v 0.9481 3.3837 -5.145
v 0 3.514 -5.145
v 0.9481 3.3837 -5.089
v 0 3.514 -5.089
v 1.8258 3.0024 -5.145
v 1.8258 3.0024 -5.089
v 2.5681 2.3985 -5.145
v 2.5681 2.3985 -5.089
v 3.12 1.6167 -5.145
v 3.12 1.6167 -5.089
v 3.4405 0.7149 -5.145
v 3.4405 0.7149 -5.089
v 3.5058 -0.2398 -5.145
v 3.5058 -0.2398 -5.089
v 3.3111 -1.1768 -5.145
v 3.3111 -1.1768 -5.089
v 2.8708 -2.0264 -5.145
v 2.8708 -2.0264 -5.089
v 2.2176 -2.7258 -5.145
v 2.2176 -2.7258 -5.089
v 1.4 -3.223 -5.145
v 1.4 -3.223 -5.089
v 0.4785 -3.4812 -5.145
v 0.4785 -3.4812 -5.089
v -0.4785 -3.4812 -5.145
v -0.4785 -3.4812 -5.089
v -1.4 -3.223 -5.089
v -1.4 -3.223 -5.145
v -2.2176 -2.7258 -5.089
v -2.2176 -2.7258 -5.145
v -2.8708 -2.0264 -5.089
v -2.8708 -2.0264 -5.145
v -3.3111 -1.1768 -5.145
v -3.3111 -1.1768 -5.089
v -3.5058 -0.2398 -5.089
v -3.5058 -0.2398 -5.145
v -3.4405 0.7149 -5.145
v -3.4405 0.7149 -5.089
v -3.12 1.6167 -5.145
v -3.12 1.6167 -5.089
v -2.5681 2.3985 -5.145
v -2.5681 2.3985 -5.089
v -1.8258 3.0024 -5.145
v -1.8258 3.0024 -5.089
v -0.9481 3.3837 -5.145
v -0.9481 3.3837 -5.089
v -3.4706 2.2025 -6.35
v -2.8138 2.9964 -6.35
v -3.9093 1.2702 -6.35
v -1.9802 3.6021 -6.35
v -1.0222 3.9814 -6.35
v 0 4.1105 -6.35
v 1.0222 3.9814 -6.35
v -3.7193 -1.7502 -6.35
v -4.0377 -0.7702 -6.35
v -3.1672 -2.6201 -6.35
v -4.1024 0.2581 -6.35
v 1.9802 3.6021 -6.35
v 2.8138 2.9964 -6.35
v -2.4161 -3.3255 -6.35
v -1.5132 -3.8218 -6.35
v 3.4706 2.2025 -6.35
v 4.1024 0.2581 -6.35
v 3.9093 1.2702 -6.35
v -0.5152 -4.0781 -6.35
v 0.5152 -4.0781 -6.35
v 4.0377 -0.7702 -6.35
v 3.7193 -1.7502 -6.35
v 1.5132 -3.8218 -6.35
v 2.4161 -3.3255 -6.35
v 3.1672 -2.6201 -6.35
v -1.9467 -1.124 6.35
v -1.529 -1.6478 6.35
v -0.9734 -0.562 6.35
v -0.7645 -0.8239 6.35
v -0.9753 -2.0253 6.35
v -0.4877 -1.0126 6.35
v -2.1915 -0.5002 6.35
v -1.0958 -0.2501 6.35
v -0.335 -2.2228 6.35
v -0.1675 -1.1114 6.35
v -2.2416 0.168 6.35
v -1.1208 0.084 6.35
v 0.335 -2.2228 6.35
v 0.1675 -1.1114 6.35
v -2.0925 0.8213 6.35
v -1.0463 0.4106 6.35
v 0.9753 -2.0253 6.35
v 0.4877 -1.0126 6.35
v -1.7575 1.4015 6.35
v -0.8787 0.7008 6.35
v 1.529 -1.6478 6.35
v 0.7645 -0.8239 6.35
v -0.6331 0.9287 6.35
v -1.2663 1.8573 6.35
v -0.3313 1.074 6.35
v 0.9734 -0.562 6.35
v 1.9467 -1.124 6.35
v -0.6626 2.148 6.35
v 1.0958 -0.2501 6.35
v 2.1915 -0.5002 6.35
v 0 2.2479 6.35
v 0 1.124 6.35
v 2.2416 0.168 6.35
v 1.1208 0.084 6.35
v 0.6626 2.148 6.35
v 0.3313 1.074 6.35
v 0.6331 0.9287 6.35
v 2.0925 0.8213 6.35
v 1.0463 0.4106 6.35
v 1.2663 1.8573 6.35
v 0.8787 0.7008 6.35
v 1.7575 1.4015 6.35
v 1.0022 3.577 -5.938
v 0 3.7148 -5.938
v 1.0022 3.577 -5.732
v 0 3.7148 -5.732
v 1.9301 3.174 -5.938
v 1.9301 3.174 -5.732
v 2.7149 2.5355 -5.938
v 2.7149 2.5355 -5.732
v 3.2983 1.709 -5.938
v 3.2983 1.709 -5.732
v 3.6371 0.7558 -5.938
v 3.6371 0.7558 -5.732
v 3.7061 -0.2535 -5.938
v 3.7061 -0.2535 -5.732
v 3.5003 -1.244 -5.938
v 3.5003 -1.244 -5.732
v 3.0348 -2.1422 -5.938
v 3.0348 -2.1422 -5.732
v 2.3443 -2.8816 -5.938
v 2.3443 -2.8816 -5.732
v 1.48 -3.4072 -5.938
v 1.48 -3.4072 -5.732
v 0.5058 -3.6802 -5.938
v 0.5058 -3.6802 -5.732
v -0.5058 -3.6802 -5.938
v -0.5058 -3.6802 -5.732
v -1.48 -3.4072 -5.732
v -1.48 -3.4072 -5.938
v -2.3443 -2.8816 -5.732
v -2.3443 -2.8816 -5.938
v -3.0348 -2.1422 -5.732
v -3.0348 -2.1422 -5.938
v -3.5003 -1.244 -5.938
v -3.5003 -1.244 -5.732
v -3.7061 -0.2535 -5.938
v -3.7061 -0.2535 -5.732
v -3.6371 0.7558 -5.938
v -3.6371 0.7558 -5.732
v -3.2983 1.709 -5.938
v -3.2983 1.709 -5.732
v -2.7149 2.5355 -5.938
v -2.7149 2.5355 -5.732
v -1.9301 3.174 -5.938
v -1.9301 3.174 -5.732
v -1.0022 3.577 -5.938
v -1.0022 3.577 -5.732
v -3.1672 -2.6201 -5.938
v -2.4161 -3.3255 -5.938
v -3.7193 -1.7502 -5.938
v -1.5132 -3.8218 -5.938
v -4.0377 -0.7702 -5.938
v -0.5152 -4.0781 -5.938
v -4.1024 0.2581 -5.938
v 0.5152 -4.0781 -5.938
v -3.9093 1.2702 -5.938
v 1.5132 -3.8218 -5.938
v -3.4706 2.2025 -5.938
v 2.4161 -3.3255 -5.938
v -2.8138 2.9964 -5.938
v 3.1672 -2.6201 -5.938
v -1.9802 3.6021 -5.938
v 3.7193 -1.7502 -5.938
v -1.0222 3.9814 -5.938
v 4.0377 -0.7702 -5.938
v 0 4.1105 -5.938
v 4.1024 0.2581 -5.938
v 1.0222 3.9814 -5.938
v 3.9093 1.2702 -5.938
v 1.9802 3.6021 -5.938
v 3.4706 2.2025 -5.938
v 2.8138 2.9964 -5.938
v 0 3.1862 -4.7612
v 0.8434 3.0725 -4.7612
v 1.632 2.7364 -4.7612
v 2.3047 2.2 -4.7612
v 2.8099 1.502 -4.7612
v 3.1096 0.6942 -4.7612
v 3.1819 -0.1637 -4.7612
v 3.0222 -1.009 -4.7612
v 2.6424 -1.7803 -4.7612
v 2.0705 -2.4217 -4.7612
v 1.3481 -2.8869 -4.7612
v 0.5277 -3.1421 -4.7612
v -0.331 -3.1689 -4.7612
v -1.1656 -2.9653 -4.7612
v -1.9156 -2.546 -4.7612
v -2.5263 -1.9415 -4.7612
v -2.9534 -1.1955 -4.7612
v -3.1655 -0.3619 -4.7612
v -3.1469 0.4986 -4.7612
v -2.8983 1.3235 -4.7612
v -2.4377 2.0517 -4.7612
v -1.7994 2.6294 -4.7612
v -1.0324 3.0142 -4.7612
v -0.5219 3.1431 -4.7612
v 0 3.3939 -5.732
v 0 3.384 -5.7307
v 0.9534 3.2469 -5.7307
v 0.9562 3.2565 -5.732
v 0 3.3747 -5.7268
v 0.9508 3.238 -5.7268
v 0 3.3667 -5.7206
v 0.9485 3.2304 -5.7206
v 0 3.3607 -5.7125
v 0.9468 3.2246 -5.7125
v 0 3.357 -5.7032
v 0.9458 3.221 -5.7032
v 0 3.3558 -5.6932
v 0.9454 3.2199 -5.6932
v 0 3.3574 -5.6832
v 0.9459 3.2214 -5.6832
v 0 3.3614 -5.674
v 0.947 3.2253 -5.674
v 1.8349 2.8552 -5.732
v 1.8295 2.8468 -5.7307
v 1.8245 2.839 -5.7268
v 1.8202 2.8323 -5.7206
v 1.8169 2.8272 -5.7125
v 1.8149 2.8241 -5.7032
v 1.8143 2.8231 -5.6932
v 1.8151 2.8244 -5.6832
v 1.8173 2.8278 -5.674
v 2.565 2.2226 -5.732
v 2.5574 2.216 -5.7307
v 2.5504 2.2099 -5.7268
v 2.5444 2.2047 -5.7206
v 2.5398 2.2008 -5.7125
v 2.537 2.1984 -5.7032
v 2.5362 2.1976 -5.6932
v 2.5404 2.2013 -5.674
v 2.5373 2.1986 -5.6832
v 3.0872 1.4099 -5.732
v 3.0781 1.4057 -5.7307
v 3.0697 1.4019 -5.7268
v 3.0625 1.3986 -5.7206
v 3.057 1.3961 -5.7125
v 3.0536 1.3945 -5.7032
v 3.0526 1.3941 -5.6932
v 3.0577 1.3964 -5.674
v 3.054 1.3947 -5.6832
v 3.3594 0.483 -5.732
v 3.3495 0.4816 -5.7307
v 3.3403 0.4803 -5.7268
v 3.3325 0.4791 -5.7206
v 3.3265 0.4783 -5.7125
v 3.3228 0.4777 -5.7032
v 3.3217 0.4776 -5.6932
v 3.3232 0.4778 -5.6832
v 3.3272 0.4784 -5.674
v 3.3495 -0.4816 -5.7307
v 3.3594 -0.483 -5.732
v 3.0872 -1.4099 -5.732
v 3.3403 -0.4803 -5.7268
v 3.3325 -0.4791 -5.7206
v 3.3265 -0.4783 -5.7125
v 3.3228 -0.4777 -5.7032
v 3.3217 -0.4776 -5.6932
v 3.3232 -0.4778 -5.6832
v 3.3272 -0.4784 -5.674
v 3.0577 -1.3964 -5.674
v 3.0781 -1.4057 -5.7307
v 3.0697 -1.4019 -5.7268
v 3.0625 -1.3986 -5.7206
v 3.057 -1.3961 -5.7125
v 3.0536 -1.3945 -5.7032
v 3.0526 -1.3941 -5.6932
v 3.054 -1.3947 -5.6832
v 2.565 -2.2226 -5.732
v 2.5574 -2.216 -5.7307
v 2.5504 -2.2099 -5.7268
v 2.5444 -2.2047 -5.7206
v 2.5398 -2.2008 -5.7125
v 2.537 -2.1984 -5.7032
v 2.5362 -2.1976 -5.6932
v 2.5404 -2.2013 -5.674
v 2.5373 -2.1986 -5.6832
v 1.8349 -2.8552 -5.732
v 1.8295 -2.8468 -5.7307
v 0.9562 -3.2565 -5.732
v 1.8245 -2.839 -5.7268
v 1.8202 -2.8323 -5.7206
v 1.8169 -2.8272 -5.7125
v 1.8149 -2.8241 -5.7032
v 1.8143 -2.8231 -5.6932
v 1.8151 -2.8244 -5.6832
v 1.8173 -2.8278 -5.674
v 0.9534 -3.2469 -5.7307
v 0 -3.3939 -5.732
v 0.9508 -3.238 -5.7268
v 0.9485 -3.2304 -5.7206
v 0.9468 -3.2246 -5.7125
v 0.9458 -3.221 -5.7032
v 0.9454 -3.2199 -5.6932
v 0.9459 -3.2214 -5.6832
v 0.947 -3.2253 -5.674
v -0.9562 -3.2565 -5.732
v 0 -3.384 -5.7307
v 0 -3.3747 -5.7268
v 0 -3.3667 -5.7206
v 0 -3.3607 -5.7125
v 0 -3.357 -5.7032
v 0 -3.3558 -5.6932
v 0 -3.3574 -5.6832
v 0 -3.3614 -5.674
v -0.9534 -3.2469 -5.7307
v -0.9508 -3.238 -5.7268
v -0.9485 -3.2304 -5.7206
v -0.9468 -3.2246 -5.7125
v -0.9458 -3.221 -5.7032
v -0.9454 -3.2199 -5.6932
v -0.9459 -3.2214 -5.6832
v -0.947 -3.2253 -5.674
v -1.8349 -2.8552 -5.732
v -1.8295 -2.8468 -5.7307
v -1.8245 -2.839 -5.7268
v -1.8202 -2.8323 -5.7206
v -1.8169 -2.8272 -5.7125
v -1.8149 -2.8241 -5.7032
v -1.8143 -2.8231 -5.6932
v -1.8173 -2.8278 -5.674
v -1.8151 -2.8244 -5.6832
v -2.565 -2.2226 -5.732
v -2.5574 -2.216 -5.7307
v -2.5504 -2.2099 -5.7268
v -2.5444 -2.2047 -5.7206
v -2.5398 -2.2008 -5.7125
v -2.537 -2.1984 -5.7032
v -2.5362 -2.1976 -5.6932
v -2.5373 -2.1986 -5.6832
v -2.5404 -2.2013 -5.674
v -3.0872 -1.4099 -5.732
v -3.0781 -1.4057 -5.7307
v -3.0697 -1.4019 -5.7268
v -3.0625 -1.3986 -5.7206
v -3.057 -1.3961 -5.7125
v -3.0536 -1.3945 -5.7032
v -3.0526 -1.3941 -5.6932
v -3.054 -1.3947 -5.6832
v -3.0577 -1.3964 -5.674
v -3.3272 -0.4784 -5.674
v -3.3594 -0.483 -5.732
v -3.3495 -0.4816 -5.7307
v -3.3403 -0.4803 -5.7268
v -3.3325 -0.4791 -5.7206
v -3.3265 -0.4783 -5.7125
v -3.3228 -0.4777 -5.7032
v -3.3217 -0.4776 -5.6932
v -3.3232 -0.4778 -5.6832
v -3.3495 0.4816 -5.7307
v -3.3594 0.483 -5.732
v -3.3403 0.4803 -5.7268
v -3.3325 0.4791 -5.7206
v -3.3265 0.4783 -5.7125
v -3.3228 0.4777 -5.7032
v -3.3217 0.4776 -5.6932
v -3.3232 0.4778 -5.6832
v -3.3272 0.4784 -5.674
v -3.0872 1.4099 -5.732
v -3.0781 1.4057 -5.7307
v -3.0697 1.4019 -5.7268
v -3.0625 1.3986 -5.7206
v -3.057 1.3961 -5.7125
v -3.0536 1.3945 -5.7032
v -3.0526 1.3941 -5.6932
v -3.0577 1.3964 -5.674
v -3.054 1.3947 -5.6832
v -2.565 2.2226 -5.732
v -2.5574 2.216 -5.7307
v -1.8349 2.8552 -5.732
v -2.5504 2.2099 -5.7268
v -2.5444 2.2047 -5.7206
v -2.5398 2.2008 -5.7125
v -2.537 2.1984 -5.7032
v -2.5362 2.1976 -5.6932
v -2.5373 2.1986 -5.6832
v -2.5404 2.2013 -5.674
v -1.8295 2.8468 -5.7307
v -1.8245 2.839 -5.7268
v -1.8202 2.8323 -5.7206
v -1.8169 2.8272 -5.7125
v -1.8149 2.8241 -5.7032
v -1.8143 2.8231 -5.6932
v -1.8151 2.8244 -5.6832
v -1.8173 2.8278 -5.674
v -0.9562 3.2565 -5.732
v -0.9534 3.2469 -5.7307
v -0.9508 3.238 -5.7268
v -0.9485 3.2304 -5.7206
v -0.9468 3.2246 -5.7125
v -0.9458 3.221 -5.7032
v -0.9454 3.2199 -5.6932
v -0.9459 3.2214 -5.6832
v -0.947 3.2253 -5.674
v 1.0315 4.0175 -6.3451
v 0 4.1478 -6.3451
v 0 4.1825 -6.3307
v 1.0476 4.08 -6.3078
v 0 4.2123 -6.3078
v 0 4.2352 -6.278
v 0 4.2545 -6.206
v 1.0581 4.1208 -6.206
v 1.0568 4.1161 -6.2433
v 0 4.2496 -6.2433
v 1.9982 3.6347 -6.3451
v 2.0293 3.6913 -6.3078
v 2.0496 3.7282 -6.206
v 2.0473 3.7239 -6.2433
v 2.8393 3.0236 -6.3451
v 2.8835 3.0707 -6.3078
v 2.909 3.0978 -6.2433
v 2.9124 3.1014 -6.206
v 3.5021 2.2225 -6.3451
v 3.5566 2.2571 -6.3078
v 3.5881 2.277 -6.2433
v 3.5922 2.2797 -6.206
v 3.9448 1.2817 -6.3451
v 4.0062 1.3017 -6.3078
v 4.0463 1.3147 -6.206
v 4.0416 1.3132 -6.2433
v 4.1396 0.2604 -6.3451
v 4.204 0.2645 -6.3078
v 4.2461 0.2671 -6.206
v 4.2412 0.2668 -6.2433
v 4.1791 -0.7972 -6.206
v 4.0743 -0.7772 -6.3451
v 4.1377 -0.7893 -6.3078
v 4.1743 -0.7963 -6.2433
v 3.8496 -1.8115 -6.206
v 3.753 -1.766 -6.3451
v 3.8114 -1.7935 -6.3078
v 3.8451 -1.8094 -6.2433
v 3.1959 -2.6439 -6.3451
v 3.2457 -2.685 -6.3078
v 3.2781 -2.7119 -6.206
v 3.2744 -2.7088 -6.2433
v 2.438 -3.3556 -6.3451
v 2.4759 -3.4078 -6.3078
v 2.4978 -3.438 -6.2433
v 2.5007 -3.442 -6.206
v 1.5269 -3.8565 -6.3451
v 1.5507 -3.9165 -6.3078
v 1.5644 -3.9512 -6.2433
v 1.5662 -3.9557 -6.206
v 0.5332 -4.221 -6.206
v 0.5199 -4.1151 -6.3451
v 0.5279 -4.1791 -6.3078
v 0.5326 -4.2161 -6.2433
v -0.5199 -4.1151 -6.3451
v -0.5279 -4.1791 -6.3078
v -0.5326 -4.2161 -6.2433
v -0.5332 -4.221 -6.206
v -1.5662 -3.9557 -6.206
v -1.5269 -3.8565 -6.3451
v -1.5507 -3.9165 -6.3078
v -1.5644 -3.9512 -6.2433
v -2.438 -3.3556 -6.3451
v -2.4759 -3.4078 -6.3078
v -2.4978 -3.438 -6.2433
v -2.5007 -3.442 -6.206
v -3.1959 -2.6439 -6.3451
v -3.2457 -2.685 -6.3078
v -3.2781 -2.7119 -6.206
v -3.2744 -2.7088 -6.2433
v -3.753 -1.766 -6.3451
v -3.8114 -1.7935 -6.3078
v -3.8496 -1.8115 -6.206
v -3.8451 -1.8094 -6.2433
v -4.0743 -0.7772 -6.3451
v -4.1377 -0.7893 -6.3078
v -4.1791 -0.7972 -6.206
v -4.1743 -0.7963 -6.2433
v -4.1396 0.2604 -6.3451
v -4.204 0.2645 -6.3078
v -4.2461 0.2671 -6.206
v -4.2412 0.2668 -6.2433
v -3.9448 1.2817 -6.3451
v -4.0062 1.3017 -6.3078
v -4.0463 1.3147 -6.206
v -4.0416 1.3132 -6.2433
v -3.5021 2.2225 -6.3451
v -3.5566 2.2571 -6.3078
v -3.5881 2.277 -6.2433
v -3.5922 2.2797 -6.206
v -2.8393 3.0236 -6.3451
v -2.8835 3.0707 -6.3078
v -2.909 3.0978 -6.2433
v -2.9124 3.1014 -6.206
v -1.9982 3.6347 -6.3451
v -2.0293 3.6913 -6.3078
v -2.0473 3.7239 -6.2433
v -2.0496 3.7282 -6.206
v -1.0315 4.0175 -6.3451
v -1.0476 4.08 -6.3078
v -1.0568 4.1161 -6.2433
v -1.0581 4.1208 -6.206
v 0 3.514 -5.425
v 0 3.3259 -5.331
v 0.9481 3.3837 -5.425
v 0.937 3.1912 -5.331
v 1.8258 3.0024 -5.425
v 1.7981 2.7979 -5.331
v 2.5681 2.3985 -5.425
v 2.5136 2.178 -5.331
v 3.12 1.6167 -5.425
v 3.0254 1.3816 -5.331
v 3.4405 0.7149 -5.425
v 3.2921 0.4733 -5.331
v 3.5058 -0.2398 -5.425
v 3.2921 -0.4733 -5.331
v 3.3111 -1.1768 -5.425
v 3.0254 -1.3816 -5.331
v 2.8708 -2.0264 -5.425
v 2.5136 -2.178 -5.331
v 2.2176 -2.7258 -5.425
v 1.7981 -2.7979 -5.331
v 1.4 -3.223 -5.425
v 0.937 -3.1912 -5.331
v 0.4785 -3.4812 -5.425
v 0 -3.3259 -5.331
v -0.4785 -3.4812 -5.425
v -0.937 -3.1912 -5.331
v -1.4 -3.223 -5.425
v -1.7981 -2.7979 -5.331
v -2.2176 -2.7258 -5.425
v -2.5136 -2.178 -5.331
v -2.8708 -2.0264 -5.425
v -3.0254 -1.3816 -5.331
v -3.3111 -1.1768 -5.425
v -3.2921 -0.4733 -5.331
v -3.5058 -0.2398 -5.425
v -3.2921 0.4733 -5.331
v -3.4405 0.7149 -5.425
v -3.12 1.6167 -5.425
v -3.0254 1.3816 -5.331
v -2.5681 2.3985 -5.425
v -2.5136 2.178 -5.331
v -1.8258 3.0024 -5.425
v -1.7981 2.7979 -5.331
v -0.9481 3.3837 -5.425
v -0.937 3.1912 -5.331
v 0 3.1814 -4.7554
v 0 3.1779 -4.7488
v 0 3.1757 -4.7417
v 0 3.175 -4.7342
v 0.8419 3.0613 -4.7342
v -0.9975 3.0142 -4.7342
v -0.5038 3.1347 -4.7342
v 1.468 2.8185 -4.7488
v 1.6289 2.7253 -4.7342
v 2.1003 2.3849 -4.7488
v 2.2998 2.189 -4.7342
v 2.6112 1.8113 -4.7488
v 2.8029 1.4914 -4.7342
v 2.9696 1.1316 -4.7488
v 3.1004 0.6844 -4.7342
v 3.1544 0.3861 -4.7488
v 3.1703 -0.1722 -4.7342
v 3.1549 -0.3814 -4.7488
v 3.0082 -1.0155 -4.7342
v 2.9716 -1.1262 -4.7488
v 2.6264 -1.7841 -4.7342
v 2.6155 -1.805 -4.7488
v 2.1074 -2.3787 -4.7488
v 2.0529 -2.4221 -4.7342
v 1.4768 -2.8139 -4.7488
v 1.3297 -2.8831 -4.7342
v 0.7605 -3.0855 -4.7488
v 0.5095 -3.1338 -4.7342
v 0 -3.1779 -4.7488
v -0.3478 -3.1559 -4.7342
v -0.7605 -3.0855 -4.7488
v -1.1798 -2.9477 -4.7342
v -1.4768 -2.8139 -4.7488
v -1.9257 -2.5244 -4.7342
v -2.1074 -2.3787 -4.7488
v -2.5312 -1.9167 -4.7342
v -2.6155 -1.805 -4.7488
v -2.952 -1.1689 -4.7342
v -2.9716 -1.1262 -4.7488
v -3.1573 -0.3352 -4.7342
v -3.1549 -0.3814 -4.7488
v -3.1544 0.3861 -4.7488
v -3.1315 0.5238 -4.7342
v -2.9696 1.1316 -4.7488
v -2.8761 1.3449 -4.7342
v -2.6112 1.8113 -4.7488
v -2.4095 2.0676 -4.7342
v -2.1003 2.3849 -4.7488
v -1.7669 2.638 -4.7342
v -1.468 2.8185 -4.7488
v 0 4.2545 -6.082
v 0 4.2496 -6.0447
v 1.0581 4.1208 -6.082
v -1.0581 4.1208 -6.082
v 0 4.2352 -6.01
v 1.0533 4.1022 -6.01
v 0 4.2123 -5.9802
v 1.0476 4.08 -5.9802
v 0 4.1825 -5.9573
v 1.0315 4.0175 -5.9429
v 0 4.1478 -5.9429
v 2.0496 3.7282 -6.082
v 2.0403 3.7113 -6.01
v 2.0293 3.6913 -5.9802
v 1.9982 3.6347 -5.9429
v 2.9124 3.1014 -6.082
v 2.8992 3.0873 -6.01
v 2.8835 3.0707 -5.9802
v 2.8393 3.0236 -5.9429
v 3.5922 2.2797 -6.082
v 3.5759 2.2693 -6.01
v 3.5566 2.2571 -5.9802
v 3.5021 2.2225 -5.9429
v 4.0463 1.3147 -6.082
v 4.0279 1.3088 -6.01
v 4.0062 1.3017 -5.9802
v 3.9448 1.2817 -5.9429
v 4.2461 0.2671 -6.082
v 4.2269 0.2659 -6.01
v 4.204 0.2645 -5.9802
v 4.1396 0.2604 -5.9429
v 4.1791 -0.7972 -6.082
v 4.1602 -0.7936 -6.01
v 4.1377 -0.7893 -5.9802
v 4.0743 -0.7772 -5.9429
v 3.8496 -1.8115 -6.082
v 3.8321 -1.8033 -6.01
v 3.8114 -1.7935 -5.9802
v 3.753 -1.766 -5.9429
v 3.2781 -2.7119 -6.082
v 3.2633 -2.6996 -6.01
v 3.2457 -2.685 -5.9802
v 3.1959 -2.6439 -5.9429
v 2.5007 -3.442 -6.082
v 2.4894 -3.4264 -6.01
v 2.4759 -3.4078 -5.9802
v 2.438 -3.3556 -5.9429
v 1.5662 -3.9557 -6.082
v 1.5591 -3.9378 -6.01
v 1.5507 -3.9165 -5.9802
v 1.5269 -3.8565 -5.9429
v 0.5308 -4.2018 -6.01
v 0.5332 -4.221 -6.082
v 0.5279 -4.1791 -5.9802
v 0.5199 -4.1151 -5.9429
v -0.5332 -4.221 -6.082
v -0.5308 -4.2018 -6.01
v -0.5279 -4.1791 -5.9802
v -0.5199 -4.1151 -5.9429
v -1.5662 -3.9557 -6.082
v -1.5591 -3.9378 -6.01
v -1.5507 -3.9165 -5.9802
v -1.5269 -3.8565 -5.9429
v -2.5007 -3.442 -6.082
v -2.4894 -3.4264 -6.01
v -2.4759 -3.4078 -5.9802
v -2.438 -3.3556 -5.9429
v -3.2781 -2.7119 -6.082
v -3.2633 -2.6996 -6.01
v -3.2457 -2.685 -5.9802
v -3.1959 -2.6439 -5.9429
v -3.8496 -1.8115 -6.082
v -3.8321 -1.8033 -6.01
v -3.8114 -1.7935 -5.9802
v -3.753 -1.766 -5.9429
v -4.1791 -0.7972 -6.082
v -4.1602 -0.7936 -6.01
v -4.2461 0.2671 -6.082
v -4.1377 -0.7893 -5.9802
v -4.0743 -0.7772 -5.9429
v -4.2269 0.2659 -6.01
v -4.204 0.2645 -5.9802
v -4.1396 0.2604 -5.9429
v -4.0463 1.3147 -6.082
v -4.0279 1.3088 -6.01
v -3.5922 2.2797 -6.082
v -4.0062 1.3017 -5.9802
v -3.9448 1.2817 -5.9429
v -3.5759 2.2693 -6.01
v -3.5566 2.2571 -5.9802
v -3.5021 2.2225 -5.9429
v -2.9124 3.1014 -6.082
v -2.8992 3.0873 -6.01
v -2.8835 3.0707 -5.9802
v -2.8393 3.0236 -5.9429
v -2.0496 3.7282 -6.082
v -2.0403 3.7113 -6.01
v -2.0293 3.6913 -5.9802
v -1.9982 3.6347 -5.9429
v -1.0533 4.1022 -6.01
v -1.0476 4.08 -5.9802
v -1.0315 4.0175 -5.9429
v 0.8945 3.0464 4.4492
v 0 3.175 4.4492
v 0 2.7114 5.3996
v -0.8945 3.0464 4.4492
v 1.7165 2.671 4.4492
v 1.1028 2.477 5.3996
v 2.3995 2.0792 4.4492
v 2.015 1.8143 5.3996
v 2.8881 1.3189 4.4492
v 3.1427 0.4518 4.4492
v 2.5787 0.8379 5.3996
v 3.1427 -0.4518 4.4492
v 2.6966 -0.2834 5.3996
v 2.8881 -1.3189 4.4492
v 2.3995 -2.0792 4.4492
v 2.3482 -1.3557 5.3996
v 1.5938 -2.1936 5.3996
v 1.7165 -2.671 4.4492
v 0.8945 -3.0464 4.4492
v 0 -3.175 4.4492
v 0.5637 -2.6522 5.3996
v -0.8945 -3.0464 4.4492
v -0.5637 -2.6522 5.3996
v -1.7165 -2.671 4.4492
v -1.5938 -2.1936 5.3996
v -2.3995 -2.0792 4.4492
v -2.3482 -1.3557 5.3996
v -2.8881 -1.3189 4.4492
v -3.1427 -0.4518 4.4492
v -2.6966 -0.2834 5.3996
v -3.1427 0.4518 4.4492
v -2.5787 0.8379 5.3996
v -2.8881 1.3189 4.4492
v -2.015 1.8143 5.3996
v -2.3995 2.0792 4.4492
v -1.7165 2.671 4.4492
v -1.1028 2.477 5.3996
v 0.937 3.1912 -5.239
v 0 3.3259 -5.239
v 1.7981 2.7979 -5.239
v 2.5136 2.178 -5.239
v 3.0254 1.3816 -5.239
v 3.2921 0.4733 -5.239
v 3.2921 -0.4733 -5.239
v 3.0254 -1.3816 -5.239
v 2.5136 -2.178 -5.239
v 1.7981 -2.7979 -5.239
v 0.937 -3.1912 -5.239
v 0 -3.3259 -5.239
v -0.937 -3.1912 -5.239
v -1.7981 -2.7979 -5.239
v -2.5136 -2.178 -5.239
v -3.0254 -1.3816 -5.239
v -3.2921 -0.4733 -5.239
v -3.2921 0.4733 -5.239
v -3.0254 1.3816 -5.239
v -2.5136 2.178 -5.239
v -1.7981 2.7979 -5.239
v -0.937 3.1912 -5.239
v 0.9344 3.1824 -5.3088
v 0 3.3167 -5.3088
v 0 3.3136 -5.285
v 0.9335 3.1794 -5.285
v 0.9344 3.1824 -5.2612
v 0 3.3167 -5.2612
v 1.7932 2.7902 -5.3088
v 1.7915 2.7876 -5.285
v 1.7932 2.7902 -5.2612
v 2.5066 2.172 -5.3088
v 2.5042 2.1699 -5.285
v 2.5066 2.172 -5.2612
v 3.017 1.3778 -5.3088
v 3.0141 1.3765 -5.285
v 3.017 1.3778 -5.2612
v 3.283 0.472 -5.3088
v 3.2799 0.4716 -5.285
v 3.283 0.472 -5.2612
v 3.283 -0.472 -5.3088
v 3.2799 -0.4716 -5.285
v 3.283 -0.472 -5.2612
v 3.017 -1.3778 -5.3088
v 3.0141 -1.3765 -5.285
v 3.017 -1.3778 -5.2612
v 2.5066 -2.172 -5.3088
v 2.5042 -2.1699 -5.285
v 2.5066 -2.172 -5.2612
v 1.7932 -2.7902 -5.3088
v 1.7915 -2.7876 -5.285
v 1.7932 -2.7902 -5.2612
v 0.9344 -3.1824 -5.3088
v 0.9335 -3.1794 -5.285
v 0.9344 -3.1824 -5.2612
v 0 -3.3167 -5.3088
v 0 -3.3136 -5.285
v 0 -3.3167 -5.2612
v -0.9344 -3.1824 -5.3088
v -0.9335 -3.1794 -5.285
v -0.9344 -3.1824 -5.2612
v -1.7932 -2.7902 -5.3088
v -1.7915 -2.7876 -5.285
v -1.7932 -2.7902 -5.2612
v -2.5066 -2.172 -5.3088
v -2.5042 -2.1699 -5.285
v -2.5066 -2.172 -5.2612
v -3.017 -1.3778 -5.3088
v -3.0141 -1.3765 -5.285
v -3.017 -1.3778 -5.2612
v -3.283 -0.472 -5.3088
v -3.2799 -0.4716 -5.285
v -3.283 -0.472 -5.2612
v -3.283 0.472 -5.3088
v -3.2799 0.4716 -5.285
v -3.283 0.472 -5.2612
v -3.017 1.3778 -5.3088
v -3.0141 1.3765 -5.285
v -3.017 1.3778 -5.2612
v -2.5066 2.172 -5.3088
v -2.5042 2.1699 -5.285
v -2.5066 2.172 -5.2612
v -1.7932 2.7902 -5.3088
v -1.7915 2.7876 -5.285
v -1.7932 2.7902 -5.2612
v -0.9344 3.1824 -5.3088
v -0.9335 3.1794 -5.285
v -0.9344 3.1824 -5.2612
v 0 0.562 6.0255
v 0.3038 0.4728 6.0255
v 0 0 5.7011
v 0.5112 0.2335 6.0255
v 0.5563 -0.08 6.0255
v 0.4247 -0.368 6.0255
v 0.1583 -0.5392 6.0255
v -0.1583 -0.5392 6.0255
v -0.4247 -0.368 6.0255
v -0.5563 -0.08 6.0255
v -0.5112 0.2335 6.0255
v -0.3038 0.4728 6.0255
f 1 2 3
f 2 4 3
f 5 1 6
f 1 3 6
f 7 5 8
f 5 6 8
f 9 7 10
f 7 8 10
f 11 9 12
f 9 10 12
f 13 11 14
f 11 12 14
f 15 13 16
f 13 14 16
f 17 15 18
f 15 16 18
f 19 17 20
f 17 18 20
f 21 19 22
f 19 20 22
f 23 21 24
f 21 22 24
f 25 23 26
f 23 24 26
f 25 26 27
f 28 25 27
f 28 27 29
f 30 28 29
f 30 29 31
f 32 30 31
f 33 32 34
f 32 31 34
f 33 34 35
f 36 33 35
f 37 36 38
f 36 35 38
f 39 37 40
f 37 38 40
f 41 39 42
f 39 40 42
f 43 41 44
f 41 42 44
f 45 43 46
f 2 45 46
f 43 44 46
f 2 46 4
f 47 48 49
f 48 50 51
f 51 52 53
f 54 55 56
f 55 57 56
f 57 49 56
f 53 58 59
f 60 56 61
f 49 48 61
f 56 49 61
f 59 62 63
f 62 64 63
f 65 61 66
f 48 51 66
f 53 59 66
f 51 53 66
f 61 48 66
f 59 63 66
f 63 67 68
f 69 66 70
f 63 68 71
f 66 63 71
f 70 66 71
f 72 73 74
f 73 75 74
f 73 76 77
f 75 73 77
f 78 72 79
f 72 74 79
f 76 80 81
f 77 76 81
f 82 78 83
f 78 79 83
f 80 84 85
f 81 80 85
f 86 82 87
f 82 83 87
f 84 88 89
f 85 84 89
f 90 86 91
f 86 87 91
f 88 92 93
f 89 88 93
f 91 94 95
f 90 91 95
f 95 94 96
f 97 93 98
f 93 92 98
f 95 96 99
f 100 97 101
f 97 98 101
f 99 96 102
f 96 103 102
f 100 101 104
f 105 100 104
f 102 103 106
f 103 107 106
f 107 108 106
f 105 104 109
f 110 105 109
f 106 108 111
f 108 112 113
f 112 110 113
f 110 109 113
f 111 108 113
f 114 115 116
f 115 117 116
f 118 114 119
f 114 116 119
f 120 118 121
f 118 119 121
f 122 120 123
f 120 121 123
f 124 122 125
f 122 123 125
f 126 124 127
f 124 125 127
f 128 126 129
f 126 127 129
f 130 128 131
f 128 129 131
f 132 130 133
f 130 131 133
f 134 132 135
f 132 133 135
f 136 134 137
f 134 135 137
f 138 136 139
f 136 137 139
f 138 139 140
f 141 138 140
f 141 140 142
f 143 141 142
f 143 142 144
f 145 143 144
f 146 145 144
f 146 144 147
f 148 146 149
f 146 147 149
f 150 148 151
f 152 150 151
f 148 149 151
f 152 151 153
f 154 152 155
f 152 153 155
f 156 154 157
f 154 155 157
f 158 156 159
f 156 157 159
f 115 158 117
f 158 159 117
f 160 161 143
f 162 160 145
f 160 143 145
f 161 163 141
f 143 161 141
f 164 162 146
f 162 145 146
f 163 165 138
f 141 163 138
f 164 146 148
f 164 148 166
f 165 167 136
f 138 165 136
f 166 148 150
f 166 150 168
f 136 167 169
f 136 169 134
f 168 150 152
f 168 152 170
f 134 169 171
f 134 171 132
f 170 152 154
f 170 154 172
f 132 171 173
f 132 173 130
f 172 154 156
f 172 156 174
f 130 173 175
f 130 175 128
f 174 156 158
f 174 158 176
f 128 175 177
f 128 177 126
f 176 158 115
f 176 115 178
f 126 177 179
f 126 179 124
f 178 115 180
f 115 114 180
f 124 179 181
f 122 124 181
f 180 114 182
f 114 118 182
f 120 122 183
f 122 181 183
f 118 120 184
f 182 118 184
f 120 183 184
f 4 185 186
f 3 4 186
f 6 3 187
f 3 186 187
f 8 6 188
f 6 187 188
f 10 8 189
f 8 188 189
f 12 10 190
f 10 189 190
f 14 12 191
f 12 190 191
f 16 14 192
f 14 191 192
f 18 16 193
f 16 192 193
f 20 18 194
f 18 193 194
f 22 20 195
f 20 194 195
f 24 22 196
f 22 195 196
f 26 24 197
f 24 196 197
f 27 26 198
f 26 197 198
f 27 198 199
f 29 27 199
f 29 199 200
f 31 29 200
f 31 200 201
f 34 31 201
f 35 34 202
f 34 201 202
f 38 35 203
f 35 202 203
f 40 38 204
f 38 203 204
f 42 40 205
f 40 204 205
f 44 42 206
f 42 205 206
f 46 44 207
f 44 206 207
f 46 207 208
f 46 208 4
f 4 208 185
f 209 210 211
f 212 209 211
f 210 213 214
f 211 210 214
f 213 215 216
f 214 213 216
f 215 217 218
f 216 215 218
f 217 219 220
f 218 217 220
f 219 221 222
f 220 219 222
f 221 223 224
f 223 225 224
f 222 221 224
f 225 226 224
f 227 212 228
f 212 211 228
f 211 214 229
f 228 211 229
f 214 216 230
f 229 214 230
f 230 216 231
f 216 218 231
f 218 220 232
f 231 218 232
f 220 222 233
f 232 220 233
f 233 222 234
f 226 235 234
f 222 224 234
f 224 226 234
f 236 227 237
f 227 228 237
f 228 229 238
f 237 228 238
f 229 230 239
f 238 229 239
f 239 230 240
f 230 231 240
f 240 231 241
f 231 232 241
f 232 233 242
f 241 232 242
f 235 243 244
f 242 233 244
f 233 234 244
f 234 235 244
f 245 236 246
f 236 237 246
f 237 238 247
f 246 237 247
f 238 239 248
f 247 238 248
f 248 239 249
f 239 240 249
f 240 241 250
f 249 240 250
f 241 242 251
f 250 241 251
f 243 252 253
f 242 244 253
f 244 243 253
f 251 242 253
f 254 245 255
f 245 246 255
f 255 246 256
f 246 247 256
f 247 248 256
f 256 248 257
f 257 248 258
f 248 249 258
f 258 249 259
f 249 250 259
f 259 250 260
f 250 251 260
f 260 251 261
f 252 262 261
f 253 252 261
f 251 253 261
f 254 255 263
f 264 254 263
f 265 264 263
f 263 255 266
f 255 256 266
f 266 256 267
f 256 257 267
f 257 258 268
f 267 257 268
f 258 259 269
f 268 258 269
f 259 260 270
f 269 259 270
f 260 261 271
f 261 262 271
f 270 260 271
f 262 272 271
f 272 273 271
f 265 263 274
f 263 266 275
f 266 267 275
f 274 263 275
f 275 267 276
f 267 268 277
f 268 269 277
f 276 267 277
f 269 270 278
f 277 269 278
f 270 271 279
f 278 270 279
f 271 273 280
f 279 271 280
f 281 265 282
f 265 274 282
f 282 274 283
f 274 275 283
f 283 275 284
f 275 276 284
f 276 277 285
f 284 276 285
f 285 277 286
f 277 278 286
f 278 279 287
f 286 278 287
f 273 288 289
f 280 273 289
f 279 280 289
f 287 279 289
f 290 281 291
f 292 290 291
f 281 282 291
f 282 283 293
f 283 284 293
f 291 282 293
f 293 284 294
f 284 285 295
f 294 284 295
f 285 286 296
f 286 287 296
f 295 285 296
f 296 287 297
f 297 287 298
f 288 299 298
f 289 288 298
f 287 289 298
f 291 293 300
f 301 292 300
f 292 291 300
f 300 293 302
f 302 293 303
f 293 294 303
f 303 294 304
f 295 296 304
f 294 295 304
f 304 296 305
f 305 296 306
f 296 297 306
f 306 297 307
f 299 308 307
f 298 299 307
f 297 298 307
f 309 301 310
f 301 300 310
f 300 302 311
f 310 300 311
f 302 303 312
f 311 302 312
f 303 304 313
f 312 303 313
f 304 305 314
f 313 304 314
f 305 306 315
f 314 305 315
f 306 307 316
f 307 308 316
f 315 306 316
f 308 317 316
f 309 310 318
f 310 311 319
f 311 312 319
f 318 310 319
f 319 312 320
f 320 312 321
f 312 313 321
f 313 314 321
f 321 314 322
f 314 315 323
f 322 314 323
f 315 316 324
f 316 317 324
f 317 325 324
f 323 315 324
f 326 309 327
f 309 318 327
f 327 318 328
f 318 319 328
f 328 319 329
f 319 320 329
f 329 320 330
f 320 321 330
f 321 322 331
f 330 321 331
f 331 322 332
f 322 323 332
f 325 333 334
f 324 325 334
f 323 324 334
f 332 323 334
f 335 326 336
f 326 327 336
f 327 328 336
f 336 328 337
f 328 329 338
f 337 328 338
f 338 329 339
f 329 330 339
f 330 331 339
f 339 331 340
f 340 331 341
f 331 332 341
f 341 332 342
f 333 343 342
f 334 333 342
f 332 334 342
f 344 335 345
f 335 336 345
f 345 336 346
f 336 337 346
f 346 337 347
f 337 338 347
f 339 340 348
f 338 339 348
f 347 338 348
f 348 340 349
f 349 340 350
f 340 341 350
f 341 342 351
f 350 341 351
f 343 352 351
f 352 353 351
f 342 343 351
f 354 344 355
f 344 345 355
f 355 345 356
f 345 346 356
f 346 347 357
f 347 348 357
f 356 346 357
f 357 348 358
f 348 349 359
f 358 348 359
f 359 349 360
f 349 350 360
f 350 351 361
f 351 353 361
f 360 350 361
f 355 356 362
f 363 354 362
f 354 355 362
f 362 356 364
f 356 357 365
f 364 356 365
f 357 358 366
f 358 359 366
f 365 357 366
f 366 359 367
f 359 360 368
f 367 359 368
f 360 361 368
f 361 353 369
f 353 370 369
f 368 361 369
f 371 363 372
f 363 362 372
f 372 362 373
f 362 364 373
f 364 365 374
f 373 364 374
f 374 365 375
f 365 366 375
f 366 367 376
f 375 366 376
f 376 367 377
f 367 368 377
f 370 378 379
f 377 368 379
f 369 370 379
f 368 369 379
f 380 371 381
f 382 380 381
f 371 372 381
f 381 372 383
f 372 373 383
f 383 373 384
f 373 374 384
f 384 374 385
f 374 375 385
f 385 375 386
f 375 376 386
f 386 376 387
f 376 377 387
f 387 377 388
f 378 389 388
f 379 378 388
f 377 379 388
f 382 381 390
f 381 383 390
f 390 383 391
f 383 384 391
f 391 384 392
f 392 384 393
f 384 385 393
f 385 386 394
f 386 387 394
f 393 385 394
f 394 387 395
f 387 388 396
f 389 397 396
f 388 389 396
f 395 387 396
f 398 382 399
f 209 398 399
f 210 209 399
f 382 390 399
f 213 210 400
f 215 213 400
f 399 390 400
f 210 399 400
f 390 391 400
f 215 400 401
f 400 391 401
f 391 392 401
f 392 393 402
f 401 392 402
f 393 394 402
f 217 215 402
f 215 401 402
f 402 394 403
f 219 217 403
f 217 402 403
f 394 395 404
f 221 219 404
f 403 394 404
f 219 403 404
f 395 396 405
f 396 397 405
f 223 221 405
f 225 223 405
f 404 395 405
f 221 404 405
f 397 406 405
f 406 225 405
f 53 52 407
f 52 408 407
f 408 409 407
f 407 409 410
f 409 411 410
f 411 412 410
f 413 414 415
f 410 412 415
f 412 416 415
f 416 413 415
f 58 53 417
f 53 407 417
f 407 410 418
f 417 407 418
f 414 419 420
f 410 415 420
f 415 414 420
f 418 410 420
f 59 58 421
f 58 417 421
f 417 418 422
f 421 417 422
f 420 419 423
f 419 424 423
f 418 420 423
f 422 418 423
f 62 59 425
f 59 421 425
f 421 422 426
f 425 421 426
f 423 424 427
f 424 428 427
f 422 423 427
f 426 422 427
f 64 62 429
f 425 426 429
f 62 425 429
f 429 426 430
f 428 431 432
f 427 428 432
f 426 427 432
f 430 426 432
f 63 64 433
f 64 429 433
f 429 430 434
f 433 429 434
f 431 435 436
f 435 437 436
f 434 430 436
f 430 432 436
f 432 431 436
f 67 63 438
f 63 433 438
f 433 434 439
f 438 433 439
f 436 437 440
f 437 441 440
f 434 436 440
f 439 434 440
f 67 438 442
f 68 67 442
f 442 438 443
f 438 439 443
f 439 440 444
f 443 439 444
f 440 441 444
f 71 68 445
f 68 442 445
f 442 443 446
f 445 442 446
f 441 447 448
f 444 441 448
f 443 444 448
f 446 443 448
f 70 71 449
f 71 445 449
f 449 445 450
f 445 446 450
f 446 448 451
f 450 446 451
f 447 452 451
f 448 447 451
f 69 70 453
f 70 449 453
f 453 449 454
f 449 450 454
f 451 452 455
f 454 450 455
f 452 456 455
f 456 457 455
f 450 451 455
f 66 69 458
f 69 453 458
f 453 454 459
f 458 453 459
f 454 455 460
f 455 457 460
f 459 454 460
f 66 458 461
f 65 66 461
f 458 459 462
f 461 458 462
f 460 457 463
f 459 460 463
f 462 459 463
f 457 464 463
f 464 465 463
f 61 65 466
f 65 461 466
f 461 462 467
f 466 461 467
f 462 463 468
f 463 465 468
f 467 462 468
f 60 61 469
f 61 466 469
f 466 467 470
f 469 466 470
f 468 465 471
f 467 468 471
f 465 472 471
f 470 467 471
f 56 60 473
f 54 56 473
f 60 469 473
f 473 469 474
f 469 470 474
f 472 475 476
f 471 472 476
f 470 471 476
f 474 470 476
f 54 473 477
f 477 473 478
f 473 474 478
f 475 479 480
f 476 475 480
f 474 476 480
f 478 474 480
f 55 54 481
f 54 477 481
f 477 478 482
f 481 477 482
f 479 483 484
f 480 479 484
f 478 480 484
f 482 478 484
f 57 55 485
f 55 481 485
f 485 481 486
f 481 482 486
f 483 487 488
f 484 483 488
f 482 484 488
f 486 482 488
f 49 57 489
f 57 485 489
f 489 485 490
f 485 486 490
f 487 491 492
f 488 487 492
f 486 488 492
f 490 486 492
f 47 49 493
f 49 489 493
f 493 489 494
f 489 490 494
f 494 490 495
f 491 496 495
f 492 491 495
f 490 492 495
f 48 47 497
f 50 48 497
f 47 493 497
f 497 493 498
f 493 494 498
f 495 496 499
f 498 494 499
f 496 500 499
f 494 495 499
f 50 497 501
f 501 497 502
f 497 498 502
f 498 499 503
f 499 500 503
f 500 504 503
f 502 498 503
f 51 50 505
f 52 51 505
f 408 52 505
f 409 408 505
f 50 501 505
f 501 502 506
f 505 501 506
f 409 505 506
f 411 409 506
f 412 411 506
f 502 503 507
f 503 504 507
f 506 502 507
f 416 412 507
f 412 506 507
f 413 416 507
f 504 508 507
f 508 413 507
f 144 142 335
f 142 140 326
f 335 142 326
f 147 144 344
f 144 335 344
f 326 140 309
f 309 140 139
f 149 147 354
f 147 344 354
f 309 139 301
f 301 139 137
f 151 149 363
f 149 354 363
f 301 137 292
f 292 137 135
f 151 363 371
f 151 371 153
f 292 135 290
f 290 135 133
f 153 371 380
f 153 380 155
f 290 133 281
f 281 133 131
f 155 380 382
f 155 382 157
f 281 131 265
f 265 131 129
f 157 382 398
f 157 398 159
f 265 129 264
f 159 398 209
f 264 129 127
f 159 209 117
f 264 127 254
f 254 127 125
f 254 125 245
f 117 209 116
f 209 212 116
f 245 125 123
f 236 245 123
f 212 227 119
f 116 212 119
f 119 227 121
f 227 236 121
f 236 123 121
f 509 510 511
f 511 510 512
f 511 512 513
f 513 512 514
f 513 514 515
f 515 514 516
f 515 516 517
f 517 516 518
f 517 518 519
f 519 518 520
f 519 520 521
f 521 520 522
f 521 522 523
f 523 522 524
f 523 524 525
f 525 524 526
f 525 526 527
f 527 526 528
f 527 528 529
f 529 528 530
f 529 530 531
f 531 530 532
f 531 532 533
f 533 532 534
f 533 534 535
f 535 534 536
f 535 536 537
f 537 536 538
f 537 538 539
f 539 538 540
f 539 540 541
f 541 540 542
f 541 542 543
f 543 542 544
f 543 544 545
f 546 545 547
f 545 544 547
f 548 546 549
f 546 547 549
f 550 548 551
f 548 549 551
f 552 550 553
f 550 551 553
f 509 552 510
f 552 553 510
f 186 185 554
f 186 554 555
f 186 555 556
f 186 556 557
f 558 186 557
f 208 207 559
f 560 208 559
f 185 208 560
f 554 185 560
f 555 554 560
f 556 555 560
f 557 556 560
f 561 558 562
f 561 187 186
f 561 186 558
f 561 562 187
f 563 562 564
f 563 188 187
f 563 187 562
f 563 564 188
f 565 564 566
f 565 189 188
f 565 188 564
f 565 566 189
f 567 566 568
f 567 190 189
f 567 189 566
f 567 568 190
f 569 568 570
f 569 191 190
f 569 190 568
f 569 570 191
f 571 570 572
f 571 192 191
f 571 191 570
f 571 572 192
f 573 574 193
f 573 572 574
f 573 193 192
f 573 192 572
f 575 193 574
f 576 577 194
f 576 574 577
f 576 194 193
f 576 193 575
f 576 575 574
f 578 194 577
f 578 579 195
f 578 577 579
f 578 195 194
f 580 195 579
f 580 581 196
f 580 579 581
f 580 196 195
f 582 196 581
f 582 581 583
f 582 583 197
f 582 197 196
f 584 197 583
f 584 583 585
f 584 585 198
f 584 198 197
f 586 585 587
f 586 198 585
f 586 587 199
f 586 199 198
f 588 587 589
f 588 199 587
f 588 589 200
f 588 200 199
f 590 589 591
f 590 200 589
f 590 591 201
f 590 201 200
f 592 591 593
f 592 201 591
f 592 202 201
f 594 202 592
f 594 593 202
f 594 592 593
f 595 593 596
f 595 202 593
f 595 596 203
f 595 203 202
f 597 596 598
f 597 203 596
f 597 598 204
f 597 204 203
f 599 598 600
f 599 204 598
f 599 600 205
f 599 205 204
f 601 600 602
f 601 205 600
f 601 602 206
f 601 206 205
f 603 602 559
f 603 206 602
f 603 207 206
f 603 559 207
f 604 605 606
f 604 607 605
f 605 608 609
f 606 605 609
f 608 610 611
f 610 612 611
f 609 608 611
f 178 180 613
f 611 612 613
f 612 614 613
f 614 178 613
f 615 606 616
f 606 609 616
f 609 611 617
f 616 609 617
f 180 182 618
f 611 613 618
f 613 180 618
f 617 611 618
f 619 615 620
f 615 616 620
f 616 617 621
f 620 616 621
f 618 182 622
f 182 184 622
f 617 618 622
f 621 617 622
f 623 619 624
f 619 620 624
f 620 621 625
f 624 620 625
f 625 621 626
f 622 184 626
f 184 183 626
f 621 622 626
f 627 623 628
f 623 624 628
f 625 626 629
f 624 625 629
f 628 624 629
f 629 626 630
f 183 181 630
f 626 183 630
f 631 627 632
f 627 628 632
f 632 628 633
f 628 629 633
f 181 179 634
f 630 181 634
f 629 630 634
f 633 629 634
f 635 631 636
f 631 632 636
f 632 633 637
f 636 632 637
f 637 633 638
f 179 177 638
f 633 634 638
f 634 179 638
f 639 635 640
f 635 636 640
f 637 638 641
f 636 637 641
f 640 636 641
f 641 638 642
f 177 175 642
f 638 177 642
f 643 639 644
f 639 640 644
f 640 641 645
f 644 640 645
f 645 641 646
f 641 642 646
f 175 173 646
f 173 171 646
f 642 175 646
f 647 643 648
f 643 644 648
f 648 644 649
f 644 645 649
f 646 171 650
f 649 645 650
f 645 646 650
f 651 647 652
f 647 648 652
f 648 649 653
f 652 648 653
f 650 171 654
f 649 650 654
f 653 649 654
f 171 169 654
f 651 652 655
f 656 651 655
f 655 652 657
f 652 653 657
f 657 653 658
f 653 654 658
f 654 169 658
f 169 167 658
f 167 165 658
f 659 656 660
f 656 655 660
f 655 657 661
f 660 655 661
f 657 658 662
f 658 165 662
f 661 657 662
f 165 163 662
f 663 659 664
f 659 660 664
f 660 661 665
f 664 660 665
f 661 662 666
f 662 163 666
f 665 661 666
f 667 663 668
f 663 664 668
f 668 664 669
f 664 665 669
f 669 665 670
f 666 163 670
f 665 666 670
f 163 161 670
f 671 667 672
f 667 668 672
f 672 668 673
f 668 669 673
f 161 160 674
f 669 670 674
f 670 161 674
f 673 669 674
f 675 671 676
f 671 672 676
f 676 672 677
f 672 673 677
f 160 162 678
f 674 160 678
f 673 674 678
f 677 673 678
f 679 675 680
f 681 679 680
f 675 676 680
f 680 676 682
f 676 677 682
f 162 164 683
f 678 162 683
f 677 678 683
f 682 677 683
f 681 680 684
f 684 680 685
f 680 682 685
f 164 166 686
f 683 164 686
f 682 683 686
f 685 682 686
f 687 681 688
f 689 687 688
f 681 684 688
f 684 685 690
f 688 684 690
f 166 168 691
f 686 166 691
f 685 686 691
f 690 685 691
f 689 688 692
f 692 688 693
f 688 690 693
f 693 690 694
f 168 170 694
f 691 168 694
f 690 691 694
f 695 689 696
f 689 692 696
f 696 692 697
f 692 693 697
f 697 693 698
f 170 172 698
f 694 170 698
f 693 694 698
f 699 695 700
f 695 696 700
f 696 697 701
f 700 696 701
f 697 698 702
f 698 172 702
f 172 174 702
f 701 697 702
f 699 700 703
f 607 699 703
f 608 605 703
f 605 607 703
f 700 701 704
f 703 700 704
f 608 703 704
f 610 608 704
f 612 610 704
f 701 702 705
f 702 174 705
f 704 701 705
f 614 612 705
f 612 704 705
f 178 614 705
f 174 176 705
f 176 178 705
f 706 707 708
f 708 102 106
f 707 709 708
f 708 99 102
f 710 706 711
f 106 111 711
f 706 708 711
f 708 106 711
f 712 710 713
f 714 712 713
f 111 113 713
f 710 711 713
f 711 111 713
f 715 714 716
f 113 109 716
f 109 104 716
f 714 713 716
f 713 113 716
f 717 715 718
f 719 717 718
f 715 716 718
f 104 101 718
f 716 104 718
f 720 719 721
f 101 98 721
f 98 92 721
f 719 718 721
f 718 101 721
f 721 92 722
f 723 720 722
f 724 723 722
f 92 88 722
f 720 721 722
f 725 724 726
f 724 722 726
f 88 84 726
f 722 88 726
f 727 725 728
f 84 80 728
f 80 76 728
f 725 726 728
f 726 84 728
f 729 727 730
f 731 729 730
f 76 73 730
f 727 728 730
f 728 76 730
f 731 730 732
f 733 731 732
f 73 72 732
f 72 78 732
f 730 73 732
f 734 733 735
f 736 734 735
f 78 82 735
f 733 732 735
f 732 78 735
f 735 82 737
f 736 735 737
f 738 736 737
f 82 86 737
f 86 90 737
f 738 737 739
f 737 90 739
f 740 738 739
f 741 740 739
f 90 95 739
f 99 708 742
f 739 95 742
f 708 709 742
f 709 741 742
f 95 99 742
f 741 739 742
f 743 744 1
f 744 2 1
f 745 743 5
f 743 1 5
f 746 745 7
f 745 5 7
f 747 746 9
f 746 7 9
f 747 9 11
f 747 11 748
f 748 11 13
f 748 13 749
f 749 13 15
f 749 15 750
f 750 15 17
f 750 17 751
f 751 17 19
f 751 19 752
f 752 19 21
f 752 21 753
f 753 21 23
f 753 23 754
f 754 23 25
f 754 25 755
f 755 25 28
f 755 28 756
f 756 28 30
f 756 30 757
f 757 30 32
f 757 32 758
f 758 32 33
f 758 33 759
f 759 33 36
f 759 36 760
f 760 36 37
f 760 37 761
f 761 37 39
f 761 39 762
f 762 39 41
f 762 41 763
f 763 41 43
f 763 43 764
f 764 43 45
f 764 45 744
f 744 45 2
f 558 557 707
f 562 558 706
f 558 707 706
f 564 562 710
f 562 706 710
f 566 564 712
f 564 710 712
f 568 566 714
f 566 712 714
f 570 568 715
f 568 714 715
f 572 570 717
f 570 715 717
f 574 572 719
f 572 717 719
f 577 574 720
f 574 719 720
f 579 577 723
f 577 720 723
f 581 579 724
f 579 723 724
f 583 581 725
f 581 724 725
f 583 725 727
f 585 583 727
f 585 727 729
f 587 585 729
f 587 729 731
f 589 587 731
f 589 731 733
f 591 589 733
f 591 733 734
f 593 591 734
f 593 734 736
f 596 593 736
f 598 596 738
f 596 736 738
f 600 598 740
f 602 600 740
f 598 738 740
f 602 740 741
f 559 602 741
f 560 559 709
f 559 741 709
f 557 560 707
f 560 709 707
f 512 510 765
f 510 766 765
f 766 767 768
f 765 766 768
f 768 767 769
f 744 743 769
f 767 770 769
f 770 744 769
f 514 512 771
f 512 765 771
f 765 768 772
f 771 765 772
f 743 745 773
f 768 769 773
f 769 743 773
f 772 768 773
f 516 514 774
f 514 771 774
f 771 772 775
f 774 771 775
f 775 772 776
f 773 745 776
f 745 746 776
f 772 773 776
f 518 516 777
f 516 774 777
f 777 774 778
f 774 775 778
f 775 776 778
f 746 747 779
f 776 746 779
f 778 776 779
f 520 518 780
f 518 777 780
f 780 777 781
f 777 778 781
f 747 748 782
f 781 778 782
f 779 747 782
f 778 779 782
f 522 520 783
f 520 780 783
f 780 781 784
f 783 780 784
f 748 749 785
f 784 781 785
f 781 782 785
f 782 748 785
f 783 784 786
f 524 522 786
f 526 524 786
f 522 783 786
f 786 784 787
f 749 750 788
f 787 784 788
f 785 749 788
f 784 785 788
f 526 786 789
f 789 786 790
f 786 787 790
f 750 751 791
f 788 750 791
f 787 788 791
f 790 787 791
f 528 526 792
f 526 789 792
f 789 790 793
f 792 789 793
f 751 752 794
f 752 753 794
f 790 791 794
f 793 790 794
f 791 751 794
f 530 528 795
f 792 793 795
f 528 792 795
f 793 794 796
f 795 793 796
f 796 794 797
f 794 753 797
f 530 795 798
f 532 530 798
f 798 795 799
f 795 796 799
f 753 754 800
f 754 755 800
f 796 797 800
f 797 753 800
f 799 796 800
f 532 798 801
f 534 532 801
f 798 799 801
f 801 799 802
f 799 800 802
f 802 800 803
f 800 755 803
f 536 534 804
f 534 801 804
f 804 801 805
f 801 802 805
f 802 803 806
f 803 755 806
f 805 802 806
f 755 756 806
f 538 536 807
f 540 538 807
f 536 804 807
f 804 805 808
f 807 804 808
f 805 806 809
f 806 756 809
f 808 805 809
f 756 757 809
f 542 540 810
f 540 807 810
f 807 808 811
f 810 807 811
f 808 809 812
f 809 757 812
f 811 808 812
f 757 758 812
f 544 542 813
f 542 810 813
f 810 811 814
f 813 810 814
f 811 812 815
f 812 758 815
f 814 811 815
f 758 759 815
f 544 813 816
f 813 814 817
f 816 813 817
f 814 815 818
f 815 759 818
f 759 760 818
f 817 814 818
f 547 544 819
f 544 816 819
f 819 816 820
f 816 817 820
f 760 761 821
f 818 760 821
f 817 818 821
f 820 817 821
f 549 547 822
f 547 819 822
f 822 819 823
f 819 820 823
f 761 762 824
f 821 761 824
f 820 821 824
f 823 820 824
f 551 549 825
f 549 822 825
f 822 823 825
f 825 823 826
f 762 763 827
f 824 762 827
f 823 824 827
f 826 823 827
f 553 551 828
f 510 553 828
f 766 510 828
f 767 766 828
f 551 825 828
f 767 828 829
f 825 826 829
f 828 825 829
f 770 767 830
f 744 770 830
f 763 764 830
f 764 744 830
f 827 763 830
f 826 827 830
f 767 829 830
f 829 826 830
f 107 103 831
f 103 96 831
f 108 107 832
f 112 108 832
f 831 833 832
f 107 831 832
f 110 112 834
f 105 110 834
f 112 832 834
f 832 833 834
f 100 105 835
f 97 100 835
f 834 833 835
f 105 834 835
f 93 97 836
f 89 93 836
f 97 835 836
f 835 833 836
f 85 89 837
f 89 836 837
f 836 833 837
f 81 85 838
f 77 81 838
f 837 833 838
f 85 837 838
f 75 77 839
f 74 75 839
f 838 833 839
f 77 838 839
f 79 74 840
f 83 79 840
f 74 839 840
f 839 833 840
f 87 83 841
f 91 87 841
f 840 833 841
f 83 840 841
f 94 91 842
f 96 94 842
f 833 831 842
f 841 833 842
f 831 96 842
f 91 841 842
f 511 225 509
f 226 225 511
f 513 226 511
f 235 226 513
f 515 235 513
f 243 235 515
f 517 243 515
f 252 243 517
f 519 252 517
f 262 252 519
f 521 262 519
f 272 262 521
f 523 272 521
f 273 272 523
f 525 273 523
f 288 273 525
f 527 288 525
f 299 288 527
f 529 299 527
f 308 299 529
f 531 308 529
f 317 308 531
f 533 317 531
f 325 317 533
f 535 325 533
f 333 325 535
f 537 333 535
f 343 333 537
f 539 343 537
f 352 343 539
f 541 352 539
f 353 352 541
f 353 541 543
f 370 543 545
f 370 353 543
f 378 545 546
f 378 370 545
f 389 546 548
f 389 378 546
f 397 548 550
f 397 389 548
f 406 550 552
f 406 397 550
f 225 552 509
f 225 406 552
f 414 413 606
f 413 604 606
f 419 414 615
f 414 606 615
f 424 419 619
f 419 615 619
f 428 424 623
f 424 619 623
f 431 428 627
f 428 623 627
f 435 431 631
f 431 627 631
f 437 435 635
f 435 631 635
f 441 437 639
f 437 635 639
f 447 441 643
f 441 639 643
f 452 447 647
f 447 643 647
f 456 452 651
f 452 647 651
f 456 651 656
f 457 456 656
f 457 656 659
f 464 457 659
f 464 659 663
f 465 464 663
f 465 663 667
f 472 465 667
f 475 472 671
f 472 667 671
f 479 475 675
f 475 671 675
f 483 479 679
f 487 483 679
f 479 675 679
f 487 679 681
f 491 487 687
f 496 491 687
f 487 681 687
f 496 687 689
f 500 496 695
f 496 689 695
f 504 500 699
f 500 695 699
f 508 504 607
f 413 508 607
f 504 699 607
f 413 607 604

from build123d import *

# Parameters (mm, degrees)
FILLET1_R = 0.0381


with BuildPart() as part:
    # Sketch2 → Revolve1 (revolve)
    with BuildSketch(Plane(origin=(0, 0, 0), x_dir=(0, 0, -1), z_dir=(1, 0, 0))):
        with BuildLine():
            Line((-6.35, 0), (6.35, 0))
            Line((6.35, 0), (6.35, 4.1105))
            ThreePointArc((6.35, 4.1105), (6.307823376, 4.212323376), (6.206, 4.2545))
            Line((6.206, 4.2545), (6.082012, 4.2545))
            ThreePointArc((6.082012, 4.2545), (5.980188624, 4.212323376), (5.938012, 4.1105))
            Line((5.938012, 4.1105), (5.938012, 3.71475))
            Line((5.938012, 3.71475), (5.732012, 3.71475))
            Line((5.732012, 3.71475), (5.732012, 3.513963))
            Line((5.732012, 3.513963), (5.425012, 3.513963))
            Line((5.425012, 3.513963), (5.3309875, 3.32591358))
            ThreePointArc((5.3309875, 3.32591358), (5.2849875, 3.313587917), (5.2389875, 3.32591358))
            Line((5.2389875, 3.32591358), (5.144963, 3.513963))
            Line((5.144963, 3.513963), (5.088963, 3.513963))
            Line((5.088963, 3.513963), (4.75, 3.175))
            Line((4.75, 3.175), (-4.449163308, 3.175))
            Line((-4.449163308, 3.175), (-6.35, 2.2479))
            Line((-6.35, 2.2479), (-6.35, 0))
        make_face()
    revolve(axis=Axis((0, 0, 6.35), (0, 0, -1)))

    # Sketch3 → Cut-Revolve1 (revolve, cut)
    with BuildSketch(Plane(origin=(0, 0, 0), x_dir=(0, 0, -1), z_dir=(1, 0, 0))):
        Polygon((-6.35, 1.12395), (-5.701087165, 0), (-6.35, 0), align=None)
    revolve(axis=Axis((0, 0, 6.35), (0, 0, -1)), mode=Mode.SUBTRACT)

    # Sketch4 → Cut-Revolve2 (revolve, cut)
    with BuildSketch(Plane(origin=(0, 0, 0), x_dir=(0, 0, -1), z_dir=(1, 0, 0))):
        Polygon((5.425012, 3.513963), (5.732012, 3.32591358), (5.732012, 3.513963), align=None)
    revolve(axis=Axis((0, 0, 6.35), (0, 0, -1)), mode=Mode.SUBTRACT)

    # Fillet1
    fillet1_edges = [part.edges().sort_by_distance(p)[0] for p in [
        (0, -3.175, -4.75),
        (0, -3.32591358, -5.732012),
    ]]
    fillet(fillet1_edges, radius=FILLET1_R)


solid = part.part
